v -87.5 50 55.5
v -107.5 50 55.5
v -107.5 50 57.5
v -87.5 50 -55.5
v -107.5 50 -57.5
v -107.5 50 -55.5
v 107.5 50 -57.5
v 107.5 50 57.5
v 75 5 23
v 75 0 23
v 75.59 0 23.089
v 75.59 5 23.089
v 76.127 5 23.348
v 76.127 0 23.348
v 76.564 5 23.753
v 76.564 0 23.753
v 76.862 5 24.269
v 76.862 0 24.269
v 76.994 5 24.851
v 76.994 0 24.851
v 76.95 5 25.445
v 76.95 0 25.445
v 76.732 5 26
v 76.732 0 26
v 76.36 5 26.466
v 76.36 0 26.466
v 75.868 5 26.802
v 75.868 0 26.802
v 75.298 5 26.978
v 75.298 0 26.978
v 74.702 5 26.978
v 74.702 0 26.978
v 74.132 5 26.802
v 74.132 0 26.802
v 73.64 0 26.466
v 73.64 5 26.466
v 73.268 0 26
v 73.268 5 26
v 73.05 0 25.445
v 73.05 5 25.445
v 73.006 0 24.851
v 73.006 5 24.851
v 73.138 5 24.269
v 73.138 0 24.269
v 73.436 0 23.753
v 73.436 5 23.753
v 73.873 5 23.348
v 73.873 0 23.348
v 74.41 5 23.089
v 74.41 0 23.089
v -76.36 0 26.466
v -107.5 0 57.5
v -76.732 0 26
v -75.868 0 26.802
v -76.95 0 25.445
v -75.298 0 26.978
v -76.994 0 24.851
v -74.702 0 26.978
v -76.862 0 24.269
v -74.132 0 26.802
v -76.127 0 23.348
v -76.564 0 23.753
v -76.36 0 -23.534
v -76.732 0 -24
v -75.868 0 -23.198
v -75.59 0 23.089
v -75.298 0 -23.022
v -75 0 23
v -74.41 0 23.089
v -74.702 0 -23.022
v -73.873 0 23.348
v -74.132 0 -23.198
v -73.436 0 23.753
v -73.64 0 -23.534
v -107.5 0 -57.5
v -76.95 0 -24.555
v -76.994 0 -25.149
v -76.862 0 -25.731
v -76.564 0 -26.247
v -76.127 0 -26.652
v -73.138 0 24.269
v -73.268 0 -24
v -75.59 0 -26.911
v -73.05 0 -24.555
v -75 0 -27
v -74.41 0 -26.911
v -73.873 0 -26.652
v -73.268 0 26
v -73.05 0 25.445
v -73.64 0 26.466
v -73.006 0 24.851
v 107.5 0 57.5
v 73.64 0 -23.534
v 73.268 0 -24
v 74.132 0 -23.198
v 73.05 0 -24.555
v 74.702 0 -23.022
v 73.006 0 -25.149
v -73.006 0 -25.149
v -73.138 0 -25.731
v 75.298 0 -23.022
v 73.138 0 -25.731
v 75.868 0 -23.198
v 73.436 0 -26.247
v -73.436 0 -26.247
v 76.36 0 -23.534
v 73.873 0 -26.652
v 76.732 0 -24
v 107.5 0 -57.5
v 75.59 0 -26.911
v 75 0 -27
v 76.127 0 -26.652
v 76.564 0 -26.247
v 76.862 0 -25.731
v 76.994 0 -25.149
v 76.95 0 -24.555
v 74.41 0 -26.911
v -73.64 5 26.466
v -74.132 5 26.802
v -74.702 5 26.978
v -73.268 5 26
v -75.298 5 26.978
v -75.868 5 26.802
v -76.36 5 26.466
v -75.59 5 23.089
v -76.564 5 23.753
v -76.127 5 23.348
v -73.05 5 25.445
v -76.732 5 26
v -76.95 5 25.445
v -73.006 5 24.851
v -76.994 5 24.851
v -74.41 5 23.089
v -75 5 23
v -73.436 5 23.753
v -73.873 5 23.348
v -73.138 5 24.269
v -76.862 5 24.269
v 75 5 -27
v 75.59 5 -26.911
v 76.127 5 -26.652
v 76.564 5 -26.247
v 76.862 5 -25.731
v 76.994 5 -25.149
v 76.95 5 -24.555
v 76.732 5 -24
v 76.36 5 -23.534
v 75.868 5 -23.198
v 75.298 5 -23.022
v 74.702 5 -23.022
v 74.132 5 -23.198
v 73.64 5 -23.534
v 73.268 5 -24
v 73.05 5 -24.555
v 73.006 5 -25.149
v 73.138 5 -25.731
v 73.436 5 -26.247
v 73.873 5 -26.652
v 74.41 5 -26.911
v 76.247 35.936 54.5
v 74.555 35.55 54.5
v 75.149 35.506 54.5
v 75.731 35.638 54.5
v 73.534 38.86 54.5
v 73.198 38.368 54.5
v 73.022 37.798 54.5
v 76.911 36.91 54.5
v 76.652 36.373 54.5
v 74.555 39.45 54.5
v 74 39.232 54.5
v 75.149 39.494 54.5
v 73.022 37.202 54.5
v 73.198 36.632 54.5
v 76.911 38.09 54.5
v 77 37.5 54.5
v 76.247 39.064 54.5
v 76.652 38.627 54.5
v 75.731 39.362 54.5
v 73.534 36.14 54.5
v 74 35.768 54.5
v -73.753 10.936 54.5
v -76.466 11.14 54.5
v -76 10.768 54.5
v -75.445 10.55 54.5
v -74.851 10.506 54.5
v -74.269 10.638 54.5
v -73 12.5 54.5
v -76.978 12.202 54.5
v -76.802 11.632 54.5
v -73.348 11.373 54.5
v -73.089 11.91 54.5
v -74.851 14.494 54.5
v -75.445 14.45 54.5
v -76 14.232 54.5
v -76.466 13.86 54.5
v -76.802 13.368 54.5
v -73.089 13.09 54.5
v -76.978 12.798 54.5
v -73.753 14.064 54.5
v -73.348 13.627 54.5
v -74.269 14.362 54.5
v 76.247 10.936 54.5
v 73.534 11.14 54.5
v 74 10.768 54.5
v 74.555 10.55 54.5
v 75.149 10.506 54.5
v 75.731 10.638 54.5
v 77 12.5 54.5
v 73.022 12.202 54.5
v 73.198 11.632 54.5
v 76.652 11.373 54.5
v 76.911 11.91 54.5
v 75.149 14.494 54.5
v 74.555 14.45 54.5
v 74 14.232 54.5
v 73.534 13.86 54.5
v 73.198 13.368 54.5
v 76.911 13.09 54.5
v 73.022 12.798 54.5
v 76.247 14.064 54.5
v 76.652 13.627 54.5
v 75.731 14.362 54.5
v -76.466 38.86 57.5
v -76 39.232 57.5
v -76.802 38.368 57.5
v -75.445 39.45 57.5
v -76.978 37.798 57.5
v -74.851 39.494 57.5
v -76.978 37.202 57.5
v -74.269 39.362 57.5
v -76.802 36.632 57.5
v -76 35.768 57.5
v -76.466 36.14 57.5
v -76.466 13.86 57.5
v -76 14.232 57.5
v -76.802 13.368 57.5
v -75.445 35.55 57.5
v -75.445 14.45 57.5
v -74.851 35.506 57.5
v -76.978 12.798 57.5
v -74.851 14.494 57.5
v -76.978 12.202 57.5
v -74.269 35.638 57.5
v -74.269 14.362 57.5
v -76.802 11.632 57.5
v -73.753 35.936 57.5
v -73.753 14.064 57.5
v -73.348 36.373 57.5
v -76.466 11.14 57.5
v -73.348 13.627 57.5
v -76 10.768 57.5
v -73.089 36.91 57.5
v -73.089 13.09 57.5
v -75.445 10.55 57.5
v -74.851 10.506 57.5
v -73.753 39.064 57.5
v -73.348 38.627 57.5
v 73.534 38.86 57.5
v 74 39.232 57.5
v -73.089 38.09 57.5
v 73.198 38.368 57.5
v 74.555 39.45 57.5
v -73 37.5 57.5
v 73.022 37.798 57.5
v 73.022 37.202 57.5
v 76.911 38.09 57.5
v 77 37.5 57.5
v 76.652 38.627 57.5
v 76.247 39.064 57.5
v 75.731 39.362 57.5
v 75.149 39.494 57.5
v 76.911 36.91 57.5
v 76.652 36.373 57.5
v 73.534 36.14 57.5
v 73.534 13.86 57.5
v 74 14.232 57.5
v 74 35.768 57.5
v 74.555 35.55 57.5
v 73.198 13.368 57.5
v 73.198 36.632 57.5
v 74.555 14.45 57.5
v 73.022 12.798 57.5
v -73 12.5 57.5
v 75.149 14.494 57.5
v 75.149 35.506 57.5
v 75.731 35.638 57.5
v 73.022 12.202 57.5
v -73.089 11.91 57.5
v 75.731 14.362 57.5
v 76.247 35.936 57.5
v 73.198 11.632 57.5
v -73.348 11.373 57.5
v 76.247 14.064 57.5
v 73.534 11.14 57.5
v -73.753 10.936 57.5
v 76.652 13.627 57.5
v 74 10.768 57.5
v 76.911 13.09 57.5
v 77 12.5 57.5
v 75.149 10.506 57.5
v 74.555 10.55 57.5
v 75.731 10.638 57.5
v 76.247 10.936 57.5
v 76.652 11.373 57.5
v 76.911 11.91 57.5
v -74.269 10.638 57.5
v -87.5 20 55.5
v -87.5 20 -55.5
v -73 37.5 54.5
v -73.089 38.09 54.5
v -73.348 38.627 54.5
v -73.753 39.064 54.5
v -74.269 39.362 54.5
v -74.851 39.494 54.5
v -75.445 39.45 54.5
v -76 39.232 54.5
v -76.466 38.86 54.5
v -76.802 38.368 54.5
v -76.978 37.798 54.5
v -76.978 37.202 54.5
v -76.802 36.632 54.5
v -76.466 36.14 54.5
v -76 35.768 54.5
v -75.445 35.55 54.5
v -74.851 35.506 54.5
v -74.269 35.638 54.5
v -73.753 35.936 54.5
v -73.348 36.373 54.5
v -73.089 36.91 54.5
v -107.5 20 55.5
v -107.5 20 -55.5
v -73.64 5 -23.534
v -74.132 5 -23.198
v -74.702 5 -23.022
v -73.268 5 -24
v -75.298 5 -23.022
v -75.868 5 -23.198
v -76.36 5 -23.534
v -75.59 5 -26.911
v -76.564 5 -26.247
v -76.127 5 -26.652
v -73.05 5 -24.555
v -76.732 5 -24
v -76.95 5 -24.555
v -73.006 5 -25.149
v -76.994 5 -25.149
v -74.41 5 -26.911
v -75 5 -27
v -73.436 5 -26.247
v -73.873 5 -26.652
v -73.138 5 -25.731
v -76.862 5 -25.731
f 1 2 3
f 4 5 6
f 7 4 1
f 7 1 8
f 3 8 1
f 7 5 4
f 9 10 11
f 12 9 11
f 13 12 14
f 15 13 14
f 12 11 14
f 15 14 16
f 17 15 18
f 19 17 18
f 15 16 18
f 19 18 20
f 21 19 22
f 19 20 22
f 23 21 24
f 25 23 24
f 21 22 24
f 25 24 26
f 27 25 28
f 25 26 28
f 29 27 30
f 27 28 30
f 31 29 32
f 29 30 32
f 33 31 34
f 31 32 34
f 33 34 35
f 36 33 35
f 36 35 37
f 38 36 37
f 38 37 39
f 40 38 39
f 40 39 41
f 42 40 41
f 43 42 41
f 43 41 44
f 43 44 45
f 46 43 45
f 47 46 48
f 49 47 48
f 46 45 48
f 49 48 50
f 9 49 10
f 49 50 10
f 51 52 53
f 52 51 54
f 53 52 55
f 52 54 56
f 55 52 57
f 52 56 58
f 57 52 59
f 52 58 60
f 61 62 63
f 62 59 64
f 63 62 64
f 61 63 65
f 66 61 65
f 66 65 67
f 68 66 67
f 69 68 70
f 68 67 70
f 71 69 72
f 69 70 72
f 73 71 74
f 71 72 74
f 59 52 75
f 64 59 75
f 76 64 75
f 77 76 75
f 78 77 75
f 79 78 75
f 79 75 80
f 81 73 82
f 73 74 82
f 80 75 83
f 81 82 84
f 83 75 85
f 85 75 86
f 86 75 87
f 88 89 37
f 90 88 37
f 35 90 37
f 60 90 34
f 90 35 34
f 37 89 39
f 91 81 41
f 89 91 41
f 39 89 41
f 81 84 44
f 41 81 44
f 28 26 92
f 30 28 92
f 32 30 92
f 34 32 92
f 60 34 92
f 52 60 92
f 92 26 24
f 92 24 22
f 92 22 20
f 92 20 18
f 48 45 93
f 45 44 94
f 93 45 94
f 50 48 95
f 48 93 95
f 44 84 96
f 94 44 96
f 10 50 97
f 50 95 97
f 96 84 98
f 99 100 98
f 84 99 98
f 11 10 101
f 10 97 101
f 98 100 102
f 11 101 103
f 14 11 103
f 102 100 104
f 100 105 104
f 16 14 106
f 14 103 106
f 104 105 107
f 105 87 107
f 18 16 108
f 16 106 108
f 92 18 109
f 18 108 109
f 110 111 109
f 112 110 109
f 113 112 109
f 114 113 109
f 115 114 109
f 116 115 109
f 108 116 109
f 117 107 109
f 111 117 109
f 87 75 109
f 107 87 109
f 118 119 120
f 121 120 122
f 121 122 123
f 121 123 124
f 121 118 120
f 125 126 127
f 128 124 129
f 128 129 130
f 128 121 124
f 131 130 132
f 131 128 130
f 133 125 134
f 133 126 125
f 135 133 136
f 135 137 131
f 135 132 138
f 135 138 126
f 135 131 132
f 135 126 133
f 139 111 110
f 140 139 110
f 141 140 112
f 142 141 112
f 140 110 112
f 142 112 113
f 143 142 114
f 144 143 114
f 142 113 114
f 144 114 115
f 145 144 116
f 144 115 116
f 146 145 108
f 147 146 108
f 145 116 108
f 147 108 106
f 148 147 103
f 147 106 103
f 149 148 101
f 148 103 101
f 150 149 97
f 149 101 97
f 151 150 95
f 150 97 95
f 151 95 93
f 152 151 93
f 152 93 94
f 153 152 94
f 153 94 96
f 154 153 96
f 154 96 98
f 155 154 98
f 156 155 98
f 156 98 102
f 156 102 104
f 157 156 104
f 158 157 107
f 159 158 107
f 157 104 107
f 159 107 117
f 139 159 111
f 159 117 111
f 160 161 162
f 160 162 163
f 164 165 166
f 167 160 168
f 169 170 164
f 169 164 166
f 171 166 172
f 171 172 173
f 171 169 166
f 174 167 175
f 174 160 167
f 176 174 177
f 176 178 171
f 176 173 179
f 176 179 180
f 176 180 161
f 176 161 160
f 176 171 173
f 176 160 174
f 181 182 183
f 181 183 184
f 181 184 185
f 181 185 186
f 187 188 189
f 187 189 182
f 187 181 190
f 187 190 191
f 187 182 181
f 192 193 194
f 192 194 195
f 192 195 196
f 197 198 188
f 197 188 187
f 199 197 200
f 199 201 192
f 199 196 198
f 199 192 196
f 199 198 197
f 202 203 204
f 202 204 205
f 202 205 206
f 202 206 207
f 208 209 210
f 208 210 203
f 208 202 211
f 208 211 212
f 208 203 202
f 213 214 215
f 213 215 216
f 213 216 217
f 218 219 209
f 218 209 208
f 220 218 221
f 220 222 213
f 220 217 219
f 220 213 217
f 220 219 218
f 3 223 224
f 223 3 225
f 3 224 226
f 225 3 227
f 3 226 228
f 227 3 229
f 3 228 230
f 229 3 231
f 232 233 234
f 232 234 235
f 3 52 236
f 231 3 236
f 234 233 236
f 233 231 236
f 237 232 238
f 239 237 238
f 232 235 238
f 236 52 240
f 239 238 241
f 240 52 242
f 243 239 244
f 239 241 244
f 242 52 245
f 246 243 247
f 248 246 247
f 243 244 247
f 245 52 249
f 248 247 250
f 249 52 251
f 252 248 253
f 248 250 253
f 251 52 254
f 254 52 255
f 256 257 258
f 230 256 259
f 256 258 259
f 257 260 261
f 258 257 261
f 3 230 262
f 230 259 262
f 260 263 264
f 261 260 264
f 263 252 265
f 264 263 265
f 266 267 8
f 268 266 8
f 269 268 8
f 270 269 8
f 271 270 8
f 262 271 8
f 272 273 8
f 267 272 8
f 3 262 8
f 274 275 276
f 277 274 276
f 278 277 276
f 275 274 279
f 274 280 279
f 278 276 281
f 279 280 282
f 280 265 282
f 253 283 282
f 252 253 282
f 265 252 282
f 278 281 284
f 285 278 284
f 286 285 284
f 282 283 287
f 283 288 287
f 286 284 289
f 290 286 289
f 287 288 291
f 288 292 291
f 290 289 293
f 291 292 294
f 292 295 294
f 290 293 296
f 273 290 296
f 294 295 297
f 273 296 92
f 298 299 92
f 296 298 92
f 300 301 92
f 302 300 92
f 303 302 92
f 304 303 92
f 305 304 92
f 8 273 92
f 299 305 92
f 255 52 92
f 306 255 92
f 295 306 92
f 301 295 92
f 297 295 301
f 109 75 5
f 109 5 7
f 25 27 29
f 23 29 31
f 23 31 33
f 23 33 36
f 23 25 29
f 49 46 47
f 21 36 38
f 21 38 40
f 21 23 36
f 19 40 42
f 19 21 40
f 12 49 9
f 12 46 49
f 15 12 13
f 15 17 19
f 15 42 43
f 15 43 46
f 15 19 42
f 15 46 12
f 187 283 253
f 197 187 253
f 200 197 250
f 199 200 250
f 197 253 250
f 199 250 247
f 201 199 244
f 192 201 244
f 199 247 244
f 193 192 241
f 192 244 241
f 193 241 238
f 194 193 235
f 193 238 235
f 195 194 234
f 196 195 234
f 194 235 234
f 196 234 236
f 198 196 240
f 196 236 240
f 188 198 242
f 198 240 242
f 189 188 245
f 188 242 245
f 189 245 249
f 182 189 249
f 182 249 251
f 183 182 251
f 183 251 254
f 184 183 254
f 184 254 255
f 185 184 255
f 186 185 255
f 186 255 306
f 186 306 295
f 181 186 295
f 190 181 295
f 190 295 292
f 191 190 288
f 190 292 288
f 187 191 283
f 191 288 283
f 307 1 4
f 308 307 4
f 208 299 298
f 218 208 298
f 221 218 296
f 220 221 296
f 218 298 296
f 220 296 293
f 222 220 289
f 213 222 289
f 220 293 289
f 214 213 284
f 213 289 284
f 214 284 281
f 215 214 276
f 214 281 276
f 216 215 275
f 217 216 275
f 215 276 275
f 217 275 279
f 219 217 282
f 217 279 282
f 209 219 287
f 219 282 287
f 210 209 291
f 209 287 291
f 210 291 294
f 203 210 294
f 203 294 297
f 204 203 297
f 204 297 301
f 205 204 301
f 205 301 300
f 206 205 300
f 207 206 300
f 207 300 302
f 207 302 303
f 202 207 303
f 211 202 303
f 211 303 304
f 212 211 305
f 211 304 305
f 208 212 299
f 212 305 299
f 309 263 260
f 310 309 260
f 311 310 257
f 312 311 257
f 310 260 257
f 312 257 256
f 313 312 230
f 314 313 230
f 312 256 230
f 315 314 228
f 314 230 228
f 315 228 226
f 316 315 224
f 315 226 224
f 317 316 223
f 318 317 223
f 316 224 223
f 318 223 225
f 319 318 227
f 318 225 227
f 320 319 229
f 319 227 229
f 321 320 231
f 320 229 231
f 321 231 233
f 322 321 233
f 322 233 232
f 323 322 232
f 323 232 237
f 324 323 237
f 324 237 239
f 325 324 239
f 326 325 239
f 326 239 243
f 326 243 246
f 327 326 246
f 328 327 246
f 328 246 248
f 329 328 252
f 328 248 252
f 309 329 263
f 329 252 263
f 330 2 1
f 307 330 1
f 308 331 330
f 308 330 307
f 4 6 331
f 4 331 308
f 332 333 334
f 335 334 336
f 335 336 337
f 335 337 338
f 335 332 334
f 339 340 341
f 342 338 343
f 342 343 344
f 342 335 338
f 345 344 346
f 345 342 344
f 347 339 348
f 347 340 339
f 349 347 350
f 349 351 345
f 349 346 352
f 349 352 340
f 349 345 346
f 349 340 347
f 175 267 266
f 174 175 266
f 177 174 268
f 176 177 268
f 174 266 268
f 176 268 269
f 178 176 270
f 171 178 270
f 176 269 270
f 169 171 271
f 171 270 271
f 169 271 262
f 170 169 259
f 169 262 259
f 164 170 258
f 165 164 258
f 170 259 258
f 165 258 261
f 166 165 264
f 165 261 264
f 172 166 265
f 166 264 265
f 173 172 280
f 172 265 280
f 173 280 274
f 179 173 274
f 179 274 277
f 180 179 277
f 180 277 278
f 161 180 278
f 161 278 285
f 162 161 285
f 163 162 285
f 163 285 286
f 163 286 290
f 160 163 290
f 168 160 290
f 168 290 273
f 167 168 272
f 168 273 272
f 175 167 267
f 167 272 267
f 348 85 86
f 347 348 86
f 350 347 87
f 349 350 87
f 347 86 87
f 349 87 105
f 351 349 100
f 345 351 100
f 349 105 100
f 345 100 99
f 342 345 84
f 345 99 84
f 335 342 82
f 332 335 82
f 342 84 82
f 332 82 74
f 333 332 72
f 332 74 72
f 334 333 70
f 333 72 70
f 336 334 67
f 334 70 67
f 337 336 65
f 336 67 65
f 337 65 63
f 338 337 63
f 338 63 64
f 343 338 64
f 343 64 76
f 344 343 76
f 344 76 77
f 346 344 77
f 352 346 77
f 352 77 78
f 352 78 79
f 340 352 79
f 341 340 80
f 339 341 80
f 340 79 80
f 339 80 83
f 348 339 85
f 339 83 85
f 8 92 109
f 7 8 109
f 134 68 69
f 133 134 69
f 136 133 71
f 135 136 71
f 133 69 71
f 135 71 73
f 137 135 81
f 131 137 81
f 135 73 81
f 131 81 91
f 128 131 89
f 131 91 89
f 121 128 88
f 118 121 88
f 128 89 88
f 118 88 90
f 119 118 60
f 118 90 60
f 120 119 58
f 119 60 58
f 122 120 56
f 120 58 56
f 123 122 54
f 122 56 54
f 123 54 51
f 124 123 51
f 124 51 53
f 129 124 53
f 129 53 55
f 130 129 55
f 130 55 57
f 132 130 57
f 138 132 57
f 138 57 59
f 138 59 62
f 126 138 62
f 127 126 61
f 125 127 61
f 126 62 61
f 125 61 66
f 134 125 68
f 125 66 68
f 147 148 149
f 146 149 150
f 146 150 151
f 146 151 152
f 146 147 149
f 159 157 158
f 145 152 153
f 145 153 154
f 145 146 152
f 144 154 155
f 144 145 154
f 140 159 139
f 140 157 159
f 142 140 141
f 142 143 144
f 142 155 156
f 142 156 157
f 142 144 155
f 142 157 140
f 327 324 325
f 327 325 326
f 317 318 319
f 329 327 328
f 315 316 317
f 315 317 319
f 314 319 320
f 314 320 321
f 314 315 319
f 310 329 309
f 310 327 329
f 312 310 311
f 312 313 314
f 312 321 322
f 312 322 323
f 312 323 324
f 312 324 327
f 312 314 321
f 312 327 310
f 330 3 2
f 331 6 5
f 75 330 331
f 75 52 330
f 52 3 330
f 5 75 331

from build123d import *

# Parameters (mm, degrees)
SKETCH1_W           = 215
SKETCH1_H           = 115
BOSS_EXTRUDE1_DEPTH = 50
SKETCH2_W           = 20
SKETCH2_H           = 111
CUT_EXTRUDE1_DEPTH  = 30
SKETCH3_R           = 2
CUT_EXTRUDE2_DEPTH  = 5
SKETCH4_R           = 2
CUT_EXTRUDE3_DEPTH  = 3


with BuildPart() as part:
    # Sketch1 → Boss-Extrude1 (new body)
    with BuildSketch(Plane(origin=(0, 0, 0), x_dir=(1, 0, 0), z_dir=(0, 1, 0))):
        Rectangle(SKETCH1_W, SKETCH1_H)
    extrude(amount=BOSS_EXTRUDE1_DEPTH)

    # Sketch2 → Cut-Extrude1 (cut)
    with BuildSketch(Plane(origin=(0, 50, 0), x_dir=(1, 0, 0), z_dir=(0, 1, 0))):
        with Locations((-97.5, 0)):
            Rectangle(SKETCH2_W, SKETCH2_H)
    extrude(amount=-CUT_EXTRUDE1_DEPTH, mode=Mode.SUBTRACT)

    # Sketch3 → Cut-Extrude2 (cut)
    with BuildSketch(Plane.XZ):
        with Locations(Location((-75, 25, 0), (0, 0, 270))):
            Circle(SKETCH3_R)
        with Locations(Location((75, 25, 0), (0, 0, 270))):
            Circle(SKETCH3_R)
        with Locations(Location((75, -25, 0), (0, 0, 270))):
            Circle(SKETCH3_R)
        with Locations(Location((-75, -25, 0), (0, 0, 270))):
            Circle(SKETCH3_R)
    extrude(amount=-CUT_EXTRUDE2_DEPTH, mode=Mode.SUBTRACT)

    # Sketch4 → Cut-Extrude3 (cut)
    with BuildSketch(Plane.XY.offset(57.5)):
        with Locations((-75, 12.5)):
            Circle(SKETCH4_R)
        with Locations((-75, 37.5)):
            Circle(SKETCH4_R)
        with Locations((75, 37.5)):
            Circle(SKETCH4_R)
        with Locations((75, 12.5)):
            Circle(SKETCH4_R)
    extrude(amount=-CUT_EXTRUDE3_DEPTH, mode=Mode.SUBTRACT)


solid = part.part
